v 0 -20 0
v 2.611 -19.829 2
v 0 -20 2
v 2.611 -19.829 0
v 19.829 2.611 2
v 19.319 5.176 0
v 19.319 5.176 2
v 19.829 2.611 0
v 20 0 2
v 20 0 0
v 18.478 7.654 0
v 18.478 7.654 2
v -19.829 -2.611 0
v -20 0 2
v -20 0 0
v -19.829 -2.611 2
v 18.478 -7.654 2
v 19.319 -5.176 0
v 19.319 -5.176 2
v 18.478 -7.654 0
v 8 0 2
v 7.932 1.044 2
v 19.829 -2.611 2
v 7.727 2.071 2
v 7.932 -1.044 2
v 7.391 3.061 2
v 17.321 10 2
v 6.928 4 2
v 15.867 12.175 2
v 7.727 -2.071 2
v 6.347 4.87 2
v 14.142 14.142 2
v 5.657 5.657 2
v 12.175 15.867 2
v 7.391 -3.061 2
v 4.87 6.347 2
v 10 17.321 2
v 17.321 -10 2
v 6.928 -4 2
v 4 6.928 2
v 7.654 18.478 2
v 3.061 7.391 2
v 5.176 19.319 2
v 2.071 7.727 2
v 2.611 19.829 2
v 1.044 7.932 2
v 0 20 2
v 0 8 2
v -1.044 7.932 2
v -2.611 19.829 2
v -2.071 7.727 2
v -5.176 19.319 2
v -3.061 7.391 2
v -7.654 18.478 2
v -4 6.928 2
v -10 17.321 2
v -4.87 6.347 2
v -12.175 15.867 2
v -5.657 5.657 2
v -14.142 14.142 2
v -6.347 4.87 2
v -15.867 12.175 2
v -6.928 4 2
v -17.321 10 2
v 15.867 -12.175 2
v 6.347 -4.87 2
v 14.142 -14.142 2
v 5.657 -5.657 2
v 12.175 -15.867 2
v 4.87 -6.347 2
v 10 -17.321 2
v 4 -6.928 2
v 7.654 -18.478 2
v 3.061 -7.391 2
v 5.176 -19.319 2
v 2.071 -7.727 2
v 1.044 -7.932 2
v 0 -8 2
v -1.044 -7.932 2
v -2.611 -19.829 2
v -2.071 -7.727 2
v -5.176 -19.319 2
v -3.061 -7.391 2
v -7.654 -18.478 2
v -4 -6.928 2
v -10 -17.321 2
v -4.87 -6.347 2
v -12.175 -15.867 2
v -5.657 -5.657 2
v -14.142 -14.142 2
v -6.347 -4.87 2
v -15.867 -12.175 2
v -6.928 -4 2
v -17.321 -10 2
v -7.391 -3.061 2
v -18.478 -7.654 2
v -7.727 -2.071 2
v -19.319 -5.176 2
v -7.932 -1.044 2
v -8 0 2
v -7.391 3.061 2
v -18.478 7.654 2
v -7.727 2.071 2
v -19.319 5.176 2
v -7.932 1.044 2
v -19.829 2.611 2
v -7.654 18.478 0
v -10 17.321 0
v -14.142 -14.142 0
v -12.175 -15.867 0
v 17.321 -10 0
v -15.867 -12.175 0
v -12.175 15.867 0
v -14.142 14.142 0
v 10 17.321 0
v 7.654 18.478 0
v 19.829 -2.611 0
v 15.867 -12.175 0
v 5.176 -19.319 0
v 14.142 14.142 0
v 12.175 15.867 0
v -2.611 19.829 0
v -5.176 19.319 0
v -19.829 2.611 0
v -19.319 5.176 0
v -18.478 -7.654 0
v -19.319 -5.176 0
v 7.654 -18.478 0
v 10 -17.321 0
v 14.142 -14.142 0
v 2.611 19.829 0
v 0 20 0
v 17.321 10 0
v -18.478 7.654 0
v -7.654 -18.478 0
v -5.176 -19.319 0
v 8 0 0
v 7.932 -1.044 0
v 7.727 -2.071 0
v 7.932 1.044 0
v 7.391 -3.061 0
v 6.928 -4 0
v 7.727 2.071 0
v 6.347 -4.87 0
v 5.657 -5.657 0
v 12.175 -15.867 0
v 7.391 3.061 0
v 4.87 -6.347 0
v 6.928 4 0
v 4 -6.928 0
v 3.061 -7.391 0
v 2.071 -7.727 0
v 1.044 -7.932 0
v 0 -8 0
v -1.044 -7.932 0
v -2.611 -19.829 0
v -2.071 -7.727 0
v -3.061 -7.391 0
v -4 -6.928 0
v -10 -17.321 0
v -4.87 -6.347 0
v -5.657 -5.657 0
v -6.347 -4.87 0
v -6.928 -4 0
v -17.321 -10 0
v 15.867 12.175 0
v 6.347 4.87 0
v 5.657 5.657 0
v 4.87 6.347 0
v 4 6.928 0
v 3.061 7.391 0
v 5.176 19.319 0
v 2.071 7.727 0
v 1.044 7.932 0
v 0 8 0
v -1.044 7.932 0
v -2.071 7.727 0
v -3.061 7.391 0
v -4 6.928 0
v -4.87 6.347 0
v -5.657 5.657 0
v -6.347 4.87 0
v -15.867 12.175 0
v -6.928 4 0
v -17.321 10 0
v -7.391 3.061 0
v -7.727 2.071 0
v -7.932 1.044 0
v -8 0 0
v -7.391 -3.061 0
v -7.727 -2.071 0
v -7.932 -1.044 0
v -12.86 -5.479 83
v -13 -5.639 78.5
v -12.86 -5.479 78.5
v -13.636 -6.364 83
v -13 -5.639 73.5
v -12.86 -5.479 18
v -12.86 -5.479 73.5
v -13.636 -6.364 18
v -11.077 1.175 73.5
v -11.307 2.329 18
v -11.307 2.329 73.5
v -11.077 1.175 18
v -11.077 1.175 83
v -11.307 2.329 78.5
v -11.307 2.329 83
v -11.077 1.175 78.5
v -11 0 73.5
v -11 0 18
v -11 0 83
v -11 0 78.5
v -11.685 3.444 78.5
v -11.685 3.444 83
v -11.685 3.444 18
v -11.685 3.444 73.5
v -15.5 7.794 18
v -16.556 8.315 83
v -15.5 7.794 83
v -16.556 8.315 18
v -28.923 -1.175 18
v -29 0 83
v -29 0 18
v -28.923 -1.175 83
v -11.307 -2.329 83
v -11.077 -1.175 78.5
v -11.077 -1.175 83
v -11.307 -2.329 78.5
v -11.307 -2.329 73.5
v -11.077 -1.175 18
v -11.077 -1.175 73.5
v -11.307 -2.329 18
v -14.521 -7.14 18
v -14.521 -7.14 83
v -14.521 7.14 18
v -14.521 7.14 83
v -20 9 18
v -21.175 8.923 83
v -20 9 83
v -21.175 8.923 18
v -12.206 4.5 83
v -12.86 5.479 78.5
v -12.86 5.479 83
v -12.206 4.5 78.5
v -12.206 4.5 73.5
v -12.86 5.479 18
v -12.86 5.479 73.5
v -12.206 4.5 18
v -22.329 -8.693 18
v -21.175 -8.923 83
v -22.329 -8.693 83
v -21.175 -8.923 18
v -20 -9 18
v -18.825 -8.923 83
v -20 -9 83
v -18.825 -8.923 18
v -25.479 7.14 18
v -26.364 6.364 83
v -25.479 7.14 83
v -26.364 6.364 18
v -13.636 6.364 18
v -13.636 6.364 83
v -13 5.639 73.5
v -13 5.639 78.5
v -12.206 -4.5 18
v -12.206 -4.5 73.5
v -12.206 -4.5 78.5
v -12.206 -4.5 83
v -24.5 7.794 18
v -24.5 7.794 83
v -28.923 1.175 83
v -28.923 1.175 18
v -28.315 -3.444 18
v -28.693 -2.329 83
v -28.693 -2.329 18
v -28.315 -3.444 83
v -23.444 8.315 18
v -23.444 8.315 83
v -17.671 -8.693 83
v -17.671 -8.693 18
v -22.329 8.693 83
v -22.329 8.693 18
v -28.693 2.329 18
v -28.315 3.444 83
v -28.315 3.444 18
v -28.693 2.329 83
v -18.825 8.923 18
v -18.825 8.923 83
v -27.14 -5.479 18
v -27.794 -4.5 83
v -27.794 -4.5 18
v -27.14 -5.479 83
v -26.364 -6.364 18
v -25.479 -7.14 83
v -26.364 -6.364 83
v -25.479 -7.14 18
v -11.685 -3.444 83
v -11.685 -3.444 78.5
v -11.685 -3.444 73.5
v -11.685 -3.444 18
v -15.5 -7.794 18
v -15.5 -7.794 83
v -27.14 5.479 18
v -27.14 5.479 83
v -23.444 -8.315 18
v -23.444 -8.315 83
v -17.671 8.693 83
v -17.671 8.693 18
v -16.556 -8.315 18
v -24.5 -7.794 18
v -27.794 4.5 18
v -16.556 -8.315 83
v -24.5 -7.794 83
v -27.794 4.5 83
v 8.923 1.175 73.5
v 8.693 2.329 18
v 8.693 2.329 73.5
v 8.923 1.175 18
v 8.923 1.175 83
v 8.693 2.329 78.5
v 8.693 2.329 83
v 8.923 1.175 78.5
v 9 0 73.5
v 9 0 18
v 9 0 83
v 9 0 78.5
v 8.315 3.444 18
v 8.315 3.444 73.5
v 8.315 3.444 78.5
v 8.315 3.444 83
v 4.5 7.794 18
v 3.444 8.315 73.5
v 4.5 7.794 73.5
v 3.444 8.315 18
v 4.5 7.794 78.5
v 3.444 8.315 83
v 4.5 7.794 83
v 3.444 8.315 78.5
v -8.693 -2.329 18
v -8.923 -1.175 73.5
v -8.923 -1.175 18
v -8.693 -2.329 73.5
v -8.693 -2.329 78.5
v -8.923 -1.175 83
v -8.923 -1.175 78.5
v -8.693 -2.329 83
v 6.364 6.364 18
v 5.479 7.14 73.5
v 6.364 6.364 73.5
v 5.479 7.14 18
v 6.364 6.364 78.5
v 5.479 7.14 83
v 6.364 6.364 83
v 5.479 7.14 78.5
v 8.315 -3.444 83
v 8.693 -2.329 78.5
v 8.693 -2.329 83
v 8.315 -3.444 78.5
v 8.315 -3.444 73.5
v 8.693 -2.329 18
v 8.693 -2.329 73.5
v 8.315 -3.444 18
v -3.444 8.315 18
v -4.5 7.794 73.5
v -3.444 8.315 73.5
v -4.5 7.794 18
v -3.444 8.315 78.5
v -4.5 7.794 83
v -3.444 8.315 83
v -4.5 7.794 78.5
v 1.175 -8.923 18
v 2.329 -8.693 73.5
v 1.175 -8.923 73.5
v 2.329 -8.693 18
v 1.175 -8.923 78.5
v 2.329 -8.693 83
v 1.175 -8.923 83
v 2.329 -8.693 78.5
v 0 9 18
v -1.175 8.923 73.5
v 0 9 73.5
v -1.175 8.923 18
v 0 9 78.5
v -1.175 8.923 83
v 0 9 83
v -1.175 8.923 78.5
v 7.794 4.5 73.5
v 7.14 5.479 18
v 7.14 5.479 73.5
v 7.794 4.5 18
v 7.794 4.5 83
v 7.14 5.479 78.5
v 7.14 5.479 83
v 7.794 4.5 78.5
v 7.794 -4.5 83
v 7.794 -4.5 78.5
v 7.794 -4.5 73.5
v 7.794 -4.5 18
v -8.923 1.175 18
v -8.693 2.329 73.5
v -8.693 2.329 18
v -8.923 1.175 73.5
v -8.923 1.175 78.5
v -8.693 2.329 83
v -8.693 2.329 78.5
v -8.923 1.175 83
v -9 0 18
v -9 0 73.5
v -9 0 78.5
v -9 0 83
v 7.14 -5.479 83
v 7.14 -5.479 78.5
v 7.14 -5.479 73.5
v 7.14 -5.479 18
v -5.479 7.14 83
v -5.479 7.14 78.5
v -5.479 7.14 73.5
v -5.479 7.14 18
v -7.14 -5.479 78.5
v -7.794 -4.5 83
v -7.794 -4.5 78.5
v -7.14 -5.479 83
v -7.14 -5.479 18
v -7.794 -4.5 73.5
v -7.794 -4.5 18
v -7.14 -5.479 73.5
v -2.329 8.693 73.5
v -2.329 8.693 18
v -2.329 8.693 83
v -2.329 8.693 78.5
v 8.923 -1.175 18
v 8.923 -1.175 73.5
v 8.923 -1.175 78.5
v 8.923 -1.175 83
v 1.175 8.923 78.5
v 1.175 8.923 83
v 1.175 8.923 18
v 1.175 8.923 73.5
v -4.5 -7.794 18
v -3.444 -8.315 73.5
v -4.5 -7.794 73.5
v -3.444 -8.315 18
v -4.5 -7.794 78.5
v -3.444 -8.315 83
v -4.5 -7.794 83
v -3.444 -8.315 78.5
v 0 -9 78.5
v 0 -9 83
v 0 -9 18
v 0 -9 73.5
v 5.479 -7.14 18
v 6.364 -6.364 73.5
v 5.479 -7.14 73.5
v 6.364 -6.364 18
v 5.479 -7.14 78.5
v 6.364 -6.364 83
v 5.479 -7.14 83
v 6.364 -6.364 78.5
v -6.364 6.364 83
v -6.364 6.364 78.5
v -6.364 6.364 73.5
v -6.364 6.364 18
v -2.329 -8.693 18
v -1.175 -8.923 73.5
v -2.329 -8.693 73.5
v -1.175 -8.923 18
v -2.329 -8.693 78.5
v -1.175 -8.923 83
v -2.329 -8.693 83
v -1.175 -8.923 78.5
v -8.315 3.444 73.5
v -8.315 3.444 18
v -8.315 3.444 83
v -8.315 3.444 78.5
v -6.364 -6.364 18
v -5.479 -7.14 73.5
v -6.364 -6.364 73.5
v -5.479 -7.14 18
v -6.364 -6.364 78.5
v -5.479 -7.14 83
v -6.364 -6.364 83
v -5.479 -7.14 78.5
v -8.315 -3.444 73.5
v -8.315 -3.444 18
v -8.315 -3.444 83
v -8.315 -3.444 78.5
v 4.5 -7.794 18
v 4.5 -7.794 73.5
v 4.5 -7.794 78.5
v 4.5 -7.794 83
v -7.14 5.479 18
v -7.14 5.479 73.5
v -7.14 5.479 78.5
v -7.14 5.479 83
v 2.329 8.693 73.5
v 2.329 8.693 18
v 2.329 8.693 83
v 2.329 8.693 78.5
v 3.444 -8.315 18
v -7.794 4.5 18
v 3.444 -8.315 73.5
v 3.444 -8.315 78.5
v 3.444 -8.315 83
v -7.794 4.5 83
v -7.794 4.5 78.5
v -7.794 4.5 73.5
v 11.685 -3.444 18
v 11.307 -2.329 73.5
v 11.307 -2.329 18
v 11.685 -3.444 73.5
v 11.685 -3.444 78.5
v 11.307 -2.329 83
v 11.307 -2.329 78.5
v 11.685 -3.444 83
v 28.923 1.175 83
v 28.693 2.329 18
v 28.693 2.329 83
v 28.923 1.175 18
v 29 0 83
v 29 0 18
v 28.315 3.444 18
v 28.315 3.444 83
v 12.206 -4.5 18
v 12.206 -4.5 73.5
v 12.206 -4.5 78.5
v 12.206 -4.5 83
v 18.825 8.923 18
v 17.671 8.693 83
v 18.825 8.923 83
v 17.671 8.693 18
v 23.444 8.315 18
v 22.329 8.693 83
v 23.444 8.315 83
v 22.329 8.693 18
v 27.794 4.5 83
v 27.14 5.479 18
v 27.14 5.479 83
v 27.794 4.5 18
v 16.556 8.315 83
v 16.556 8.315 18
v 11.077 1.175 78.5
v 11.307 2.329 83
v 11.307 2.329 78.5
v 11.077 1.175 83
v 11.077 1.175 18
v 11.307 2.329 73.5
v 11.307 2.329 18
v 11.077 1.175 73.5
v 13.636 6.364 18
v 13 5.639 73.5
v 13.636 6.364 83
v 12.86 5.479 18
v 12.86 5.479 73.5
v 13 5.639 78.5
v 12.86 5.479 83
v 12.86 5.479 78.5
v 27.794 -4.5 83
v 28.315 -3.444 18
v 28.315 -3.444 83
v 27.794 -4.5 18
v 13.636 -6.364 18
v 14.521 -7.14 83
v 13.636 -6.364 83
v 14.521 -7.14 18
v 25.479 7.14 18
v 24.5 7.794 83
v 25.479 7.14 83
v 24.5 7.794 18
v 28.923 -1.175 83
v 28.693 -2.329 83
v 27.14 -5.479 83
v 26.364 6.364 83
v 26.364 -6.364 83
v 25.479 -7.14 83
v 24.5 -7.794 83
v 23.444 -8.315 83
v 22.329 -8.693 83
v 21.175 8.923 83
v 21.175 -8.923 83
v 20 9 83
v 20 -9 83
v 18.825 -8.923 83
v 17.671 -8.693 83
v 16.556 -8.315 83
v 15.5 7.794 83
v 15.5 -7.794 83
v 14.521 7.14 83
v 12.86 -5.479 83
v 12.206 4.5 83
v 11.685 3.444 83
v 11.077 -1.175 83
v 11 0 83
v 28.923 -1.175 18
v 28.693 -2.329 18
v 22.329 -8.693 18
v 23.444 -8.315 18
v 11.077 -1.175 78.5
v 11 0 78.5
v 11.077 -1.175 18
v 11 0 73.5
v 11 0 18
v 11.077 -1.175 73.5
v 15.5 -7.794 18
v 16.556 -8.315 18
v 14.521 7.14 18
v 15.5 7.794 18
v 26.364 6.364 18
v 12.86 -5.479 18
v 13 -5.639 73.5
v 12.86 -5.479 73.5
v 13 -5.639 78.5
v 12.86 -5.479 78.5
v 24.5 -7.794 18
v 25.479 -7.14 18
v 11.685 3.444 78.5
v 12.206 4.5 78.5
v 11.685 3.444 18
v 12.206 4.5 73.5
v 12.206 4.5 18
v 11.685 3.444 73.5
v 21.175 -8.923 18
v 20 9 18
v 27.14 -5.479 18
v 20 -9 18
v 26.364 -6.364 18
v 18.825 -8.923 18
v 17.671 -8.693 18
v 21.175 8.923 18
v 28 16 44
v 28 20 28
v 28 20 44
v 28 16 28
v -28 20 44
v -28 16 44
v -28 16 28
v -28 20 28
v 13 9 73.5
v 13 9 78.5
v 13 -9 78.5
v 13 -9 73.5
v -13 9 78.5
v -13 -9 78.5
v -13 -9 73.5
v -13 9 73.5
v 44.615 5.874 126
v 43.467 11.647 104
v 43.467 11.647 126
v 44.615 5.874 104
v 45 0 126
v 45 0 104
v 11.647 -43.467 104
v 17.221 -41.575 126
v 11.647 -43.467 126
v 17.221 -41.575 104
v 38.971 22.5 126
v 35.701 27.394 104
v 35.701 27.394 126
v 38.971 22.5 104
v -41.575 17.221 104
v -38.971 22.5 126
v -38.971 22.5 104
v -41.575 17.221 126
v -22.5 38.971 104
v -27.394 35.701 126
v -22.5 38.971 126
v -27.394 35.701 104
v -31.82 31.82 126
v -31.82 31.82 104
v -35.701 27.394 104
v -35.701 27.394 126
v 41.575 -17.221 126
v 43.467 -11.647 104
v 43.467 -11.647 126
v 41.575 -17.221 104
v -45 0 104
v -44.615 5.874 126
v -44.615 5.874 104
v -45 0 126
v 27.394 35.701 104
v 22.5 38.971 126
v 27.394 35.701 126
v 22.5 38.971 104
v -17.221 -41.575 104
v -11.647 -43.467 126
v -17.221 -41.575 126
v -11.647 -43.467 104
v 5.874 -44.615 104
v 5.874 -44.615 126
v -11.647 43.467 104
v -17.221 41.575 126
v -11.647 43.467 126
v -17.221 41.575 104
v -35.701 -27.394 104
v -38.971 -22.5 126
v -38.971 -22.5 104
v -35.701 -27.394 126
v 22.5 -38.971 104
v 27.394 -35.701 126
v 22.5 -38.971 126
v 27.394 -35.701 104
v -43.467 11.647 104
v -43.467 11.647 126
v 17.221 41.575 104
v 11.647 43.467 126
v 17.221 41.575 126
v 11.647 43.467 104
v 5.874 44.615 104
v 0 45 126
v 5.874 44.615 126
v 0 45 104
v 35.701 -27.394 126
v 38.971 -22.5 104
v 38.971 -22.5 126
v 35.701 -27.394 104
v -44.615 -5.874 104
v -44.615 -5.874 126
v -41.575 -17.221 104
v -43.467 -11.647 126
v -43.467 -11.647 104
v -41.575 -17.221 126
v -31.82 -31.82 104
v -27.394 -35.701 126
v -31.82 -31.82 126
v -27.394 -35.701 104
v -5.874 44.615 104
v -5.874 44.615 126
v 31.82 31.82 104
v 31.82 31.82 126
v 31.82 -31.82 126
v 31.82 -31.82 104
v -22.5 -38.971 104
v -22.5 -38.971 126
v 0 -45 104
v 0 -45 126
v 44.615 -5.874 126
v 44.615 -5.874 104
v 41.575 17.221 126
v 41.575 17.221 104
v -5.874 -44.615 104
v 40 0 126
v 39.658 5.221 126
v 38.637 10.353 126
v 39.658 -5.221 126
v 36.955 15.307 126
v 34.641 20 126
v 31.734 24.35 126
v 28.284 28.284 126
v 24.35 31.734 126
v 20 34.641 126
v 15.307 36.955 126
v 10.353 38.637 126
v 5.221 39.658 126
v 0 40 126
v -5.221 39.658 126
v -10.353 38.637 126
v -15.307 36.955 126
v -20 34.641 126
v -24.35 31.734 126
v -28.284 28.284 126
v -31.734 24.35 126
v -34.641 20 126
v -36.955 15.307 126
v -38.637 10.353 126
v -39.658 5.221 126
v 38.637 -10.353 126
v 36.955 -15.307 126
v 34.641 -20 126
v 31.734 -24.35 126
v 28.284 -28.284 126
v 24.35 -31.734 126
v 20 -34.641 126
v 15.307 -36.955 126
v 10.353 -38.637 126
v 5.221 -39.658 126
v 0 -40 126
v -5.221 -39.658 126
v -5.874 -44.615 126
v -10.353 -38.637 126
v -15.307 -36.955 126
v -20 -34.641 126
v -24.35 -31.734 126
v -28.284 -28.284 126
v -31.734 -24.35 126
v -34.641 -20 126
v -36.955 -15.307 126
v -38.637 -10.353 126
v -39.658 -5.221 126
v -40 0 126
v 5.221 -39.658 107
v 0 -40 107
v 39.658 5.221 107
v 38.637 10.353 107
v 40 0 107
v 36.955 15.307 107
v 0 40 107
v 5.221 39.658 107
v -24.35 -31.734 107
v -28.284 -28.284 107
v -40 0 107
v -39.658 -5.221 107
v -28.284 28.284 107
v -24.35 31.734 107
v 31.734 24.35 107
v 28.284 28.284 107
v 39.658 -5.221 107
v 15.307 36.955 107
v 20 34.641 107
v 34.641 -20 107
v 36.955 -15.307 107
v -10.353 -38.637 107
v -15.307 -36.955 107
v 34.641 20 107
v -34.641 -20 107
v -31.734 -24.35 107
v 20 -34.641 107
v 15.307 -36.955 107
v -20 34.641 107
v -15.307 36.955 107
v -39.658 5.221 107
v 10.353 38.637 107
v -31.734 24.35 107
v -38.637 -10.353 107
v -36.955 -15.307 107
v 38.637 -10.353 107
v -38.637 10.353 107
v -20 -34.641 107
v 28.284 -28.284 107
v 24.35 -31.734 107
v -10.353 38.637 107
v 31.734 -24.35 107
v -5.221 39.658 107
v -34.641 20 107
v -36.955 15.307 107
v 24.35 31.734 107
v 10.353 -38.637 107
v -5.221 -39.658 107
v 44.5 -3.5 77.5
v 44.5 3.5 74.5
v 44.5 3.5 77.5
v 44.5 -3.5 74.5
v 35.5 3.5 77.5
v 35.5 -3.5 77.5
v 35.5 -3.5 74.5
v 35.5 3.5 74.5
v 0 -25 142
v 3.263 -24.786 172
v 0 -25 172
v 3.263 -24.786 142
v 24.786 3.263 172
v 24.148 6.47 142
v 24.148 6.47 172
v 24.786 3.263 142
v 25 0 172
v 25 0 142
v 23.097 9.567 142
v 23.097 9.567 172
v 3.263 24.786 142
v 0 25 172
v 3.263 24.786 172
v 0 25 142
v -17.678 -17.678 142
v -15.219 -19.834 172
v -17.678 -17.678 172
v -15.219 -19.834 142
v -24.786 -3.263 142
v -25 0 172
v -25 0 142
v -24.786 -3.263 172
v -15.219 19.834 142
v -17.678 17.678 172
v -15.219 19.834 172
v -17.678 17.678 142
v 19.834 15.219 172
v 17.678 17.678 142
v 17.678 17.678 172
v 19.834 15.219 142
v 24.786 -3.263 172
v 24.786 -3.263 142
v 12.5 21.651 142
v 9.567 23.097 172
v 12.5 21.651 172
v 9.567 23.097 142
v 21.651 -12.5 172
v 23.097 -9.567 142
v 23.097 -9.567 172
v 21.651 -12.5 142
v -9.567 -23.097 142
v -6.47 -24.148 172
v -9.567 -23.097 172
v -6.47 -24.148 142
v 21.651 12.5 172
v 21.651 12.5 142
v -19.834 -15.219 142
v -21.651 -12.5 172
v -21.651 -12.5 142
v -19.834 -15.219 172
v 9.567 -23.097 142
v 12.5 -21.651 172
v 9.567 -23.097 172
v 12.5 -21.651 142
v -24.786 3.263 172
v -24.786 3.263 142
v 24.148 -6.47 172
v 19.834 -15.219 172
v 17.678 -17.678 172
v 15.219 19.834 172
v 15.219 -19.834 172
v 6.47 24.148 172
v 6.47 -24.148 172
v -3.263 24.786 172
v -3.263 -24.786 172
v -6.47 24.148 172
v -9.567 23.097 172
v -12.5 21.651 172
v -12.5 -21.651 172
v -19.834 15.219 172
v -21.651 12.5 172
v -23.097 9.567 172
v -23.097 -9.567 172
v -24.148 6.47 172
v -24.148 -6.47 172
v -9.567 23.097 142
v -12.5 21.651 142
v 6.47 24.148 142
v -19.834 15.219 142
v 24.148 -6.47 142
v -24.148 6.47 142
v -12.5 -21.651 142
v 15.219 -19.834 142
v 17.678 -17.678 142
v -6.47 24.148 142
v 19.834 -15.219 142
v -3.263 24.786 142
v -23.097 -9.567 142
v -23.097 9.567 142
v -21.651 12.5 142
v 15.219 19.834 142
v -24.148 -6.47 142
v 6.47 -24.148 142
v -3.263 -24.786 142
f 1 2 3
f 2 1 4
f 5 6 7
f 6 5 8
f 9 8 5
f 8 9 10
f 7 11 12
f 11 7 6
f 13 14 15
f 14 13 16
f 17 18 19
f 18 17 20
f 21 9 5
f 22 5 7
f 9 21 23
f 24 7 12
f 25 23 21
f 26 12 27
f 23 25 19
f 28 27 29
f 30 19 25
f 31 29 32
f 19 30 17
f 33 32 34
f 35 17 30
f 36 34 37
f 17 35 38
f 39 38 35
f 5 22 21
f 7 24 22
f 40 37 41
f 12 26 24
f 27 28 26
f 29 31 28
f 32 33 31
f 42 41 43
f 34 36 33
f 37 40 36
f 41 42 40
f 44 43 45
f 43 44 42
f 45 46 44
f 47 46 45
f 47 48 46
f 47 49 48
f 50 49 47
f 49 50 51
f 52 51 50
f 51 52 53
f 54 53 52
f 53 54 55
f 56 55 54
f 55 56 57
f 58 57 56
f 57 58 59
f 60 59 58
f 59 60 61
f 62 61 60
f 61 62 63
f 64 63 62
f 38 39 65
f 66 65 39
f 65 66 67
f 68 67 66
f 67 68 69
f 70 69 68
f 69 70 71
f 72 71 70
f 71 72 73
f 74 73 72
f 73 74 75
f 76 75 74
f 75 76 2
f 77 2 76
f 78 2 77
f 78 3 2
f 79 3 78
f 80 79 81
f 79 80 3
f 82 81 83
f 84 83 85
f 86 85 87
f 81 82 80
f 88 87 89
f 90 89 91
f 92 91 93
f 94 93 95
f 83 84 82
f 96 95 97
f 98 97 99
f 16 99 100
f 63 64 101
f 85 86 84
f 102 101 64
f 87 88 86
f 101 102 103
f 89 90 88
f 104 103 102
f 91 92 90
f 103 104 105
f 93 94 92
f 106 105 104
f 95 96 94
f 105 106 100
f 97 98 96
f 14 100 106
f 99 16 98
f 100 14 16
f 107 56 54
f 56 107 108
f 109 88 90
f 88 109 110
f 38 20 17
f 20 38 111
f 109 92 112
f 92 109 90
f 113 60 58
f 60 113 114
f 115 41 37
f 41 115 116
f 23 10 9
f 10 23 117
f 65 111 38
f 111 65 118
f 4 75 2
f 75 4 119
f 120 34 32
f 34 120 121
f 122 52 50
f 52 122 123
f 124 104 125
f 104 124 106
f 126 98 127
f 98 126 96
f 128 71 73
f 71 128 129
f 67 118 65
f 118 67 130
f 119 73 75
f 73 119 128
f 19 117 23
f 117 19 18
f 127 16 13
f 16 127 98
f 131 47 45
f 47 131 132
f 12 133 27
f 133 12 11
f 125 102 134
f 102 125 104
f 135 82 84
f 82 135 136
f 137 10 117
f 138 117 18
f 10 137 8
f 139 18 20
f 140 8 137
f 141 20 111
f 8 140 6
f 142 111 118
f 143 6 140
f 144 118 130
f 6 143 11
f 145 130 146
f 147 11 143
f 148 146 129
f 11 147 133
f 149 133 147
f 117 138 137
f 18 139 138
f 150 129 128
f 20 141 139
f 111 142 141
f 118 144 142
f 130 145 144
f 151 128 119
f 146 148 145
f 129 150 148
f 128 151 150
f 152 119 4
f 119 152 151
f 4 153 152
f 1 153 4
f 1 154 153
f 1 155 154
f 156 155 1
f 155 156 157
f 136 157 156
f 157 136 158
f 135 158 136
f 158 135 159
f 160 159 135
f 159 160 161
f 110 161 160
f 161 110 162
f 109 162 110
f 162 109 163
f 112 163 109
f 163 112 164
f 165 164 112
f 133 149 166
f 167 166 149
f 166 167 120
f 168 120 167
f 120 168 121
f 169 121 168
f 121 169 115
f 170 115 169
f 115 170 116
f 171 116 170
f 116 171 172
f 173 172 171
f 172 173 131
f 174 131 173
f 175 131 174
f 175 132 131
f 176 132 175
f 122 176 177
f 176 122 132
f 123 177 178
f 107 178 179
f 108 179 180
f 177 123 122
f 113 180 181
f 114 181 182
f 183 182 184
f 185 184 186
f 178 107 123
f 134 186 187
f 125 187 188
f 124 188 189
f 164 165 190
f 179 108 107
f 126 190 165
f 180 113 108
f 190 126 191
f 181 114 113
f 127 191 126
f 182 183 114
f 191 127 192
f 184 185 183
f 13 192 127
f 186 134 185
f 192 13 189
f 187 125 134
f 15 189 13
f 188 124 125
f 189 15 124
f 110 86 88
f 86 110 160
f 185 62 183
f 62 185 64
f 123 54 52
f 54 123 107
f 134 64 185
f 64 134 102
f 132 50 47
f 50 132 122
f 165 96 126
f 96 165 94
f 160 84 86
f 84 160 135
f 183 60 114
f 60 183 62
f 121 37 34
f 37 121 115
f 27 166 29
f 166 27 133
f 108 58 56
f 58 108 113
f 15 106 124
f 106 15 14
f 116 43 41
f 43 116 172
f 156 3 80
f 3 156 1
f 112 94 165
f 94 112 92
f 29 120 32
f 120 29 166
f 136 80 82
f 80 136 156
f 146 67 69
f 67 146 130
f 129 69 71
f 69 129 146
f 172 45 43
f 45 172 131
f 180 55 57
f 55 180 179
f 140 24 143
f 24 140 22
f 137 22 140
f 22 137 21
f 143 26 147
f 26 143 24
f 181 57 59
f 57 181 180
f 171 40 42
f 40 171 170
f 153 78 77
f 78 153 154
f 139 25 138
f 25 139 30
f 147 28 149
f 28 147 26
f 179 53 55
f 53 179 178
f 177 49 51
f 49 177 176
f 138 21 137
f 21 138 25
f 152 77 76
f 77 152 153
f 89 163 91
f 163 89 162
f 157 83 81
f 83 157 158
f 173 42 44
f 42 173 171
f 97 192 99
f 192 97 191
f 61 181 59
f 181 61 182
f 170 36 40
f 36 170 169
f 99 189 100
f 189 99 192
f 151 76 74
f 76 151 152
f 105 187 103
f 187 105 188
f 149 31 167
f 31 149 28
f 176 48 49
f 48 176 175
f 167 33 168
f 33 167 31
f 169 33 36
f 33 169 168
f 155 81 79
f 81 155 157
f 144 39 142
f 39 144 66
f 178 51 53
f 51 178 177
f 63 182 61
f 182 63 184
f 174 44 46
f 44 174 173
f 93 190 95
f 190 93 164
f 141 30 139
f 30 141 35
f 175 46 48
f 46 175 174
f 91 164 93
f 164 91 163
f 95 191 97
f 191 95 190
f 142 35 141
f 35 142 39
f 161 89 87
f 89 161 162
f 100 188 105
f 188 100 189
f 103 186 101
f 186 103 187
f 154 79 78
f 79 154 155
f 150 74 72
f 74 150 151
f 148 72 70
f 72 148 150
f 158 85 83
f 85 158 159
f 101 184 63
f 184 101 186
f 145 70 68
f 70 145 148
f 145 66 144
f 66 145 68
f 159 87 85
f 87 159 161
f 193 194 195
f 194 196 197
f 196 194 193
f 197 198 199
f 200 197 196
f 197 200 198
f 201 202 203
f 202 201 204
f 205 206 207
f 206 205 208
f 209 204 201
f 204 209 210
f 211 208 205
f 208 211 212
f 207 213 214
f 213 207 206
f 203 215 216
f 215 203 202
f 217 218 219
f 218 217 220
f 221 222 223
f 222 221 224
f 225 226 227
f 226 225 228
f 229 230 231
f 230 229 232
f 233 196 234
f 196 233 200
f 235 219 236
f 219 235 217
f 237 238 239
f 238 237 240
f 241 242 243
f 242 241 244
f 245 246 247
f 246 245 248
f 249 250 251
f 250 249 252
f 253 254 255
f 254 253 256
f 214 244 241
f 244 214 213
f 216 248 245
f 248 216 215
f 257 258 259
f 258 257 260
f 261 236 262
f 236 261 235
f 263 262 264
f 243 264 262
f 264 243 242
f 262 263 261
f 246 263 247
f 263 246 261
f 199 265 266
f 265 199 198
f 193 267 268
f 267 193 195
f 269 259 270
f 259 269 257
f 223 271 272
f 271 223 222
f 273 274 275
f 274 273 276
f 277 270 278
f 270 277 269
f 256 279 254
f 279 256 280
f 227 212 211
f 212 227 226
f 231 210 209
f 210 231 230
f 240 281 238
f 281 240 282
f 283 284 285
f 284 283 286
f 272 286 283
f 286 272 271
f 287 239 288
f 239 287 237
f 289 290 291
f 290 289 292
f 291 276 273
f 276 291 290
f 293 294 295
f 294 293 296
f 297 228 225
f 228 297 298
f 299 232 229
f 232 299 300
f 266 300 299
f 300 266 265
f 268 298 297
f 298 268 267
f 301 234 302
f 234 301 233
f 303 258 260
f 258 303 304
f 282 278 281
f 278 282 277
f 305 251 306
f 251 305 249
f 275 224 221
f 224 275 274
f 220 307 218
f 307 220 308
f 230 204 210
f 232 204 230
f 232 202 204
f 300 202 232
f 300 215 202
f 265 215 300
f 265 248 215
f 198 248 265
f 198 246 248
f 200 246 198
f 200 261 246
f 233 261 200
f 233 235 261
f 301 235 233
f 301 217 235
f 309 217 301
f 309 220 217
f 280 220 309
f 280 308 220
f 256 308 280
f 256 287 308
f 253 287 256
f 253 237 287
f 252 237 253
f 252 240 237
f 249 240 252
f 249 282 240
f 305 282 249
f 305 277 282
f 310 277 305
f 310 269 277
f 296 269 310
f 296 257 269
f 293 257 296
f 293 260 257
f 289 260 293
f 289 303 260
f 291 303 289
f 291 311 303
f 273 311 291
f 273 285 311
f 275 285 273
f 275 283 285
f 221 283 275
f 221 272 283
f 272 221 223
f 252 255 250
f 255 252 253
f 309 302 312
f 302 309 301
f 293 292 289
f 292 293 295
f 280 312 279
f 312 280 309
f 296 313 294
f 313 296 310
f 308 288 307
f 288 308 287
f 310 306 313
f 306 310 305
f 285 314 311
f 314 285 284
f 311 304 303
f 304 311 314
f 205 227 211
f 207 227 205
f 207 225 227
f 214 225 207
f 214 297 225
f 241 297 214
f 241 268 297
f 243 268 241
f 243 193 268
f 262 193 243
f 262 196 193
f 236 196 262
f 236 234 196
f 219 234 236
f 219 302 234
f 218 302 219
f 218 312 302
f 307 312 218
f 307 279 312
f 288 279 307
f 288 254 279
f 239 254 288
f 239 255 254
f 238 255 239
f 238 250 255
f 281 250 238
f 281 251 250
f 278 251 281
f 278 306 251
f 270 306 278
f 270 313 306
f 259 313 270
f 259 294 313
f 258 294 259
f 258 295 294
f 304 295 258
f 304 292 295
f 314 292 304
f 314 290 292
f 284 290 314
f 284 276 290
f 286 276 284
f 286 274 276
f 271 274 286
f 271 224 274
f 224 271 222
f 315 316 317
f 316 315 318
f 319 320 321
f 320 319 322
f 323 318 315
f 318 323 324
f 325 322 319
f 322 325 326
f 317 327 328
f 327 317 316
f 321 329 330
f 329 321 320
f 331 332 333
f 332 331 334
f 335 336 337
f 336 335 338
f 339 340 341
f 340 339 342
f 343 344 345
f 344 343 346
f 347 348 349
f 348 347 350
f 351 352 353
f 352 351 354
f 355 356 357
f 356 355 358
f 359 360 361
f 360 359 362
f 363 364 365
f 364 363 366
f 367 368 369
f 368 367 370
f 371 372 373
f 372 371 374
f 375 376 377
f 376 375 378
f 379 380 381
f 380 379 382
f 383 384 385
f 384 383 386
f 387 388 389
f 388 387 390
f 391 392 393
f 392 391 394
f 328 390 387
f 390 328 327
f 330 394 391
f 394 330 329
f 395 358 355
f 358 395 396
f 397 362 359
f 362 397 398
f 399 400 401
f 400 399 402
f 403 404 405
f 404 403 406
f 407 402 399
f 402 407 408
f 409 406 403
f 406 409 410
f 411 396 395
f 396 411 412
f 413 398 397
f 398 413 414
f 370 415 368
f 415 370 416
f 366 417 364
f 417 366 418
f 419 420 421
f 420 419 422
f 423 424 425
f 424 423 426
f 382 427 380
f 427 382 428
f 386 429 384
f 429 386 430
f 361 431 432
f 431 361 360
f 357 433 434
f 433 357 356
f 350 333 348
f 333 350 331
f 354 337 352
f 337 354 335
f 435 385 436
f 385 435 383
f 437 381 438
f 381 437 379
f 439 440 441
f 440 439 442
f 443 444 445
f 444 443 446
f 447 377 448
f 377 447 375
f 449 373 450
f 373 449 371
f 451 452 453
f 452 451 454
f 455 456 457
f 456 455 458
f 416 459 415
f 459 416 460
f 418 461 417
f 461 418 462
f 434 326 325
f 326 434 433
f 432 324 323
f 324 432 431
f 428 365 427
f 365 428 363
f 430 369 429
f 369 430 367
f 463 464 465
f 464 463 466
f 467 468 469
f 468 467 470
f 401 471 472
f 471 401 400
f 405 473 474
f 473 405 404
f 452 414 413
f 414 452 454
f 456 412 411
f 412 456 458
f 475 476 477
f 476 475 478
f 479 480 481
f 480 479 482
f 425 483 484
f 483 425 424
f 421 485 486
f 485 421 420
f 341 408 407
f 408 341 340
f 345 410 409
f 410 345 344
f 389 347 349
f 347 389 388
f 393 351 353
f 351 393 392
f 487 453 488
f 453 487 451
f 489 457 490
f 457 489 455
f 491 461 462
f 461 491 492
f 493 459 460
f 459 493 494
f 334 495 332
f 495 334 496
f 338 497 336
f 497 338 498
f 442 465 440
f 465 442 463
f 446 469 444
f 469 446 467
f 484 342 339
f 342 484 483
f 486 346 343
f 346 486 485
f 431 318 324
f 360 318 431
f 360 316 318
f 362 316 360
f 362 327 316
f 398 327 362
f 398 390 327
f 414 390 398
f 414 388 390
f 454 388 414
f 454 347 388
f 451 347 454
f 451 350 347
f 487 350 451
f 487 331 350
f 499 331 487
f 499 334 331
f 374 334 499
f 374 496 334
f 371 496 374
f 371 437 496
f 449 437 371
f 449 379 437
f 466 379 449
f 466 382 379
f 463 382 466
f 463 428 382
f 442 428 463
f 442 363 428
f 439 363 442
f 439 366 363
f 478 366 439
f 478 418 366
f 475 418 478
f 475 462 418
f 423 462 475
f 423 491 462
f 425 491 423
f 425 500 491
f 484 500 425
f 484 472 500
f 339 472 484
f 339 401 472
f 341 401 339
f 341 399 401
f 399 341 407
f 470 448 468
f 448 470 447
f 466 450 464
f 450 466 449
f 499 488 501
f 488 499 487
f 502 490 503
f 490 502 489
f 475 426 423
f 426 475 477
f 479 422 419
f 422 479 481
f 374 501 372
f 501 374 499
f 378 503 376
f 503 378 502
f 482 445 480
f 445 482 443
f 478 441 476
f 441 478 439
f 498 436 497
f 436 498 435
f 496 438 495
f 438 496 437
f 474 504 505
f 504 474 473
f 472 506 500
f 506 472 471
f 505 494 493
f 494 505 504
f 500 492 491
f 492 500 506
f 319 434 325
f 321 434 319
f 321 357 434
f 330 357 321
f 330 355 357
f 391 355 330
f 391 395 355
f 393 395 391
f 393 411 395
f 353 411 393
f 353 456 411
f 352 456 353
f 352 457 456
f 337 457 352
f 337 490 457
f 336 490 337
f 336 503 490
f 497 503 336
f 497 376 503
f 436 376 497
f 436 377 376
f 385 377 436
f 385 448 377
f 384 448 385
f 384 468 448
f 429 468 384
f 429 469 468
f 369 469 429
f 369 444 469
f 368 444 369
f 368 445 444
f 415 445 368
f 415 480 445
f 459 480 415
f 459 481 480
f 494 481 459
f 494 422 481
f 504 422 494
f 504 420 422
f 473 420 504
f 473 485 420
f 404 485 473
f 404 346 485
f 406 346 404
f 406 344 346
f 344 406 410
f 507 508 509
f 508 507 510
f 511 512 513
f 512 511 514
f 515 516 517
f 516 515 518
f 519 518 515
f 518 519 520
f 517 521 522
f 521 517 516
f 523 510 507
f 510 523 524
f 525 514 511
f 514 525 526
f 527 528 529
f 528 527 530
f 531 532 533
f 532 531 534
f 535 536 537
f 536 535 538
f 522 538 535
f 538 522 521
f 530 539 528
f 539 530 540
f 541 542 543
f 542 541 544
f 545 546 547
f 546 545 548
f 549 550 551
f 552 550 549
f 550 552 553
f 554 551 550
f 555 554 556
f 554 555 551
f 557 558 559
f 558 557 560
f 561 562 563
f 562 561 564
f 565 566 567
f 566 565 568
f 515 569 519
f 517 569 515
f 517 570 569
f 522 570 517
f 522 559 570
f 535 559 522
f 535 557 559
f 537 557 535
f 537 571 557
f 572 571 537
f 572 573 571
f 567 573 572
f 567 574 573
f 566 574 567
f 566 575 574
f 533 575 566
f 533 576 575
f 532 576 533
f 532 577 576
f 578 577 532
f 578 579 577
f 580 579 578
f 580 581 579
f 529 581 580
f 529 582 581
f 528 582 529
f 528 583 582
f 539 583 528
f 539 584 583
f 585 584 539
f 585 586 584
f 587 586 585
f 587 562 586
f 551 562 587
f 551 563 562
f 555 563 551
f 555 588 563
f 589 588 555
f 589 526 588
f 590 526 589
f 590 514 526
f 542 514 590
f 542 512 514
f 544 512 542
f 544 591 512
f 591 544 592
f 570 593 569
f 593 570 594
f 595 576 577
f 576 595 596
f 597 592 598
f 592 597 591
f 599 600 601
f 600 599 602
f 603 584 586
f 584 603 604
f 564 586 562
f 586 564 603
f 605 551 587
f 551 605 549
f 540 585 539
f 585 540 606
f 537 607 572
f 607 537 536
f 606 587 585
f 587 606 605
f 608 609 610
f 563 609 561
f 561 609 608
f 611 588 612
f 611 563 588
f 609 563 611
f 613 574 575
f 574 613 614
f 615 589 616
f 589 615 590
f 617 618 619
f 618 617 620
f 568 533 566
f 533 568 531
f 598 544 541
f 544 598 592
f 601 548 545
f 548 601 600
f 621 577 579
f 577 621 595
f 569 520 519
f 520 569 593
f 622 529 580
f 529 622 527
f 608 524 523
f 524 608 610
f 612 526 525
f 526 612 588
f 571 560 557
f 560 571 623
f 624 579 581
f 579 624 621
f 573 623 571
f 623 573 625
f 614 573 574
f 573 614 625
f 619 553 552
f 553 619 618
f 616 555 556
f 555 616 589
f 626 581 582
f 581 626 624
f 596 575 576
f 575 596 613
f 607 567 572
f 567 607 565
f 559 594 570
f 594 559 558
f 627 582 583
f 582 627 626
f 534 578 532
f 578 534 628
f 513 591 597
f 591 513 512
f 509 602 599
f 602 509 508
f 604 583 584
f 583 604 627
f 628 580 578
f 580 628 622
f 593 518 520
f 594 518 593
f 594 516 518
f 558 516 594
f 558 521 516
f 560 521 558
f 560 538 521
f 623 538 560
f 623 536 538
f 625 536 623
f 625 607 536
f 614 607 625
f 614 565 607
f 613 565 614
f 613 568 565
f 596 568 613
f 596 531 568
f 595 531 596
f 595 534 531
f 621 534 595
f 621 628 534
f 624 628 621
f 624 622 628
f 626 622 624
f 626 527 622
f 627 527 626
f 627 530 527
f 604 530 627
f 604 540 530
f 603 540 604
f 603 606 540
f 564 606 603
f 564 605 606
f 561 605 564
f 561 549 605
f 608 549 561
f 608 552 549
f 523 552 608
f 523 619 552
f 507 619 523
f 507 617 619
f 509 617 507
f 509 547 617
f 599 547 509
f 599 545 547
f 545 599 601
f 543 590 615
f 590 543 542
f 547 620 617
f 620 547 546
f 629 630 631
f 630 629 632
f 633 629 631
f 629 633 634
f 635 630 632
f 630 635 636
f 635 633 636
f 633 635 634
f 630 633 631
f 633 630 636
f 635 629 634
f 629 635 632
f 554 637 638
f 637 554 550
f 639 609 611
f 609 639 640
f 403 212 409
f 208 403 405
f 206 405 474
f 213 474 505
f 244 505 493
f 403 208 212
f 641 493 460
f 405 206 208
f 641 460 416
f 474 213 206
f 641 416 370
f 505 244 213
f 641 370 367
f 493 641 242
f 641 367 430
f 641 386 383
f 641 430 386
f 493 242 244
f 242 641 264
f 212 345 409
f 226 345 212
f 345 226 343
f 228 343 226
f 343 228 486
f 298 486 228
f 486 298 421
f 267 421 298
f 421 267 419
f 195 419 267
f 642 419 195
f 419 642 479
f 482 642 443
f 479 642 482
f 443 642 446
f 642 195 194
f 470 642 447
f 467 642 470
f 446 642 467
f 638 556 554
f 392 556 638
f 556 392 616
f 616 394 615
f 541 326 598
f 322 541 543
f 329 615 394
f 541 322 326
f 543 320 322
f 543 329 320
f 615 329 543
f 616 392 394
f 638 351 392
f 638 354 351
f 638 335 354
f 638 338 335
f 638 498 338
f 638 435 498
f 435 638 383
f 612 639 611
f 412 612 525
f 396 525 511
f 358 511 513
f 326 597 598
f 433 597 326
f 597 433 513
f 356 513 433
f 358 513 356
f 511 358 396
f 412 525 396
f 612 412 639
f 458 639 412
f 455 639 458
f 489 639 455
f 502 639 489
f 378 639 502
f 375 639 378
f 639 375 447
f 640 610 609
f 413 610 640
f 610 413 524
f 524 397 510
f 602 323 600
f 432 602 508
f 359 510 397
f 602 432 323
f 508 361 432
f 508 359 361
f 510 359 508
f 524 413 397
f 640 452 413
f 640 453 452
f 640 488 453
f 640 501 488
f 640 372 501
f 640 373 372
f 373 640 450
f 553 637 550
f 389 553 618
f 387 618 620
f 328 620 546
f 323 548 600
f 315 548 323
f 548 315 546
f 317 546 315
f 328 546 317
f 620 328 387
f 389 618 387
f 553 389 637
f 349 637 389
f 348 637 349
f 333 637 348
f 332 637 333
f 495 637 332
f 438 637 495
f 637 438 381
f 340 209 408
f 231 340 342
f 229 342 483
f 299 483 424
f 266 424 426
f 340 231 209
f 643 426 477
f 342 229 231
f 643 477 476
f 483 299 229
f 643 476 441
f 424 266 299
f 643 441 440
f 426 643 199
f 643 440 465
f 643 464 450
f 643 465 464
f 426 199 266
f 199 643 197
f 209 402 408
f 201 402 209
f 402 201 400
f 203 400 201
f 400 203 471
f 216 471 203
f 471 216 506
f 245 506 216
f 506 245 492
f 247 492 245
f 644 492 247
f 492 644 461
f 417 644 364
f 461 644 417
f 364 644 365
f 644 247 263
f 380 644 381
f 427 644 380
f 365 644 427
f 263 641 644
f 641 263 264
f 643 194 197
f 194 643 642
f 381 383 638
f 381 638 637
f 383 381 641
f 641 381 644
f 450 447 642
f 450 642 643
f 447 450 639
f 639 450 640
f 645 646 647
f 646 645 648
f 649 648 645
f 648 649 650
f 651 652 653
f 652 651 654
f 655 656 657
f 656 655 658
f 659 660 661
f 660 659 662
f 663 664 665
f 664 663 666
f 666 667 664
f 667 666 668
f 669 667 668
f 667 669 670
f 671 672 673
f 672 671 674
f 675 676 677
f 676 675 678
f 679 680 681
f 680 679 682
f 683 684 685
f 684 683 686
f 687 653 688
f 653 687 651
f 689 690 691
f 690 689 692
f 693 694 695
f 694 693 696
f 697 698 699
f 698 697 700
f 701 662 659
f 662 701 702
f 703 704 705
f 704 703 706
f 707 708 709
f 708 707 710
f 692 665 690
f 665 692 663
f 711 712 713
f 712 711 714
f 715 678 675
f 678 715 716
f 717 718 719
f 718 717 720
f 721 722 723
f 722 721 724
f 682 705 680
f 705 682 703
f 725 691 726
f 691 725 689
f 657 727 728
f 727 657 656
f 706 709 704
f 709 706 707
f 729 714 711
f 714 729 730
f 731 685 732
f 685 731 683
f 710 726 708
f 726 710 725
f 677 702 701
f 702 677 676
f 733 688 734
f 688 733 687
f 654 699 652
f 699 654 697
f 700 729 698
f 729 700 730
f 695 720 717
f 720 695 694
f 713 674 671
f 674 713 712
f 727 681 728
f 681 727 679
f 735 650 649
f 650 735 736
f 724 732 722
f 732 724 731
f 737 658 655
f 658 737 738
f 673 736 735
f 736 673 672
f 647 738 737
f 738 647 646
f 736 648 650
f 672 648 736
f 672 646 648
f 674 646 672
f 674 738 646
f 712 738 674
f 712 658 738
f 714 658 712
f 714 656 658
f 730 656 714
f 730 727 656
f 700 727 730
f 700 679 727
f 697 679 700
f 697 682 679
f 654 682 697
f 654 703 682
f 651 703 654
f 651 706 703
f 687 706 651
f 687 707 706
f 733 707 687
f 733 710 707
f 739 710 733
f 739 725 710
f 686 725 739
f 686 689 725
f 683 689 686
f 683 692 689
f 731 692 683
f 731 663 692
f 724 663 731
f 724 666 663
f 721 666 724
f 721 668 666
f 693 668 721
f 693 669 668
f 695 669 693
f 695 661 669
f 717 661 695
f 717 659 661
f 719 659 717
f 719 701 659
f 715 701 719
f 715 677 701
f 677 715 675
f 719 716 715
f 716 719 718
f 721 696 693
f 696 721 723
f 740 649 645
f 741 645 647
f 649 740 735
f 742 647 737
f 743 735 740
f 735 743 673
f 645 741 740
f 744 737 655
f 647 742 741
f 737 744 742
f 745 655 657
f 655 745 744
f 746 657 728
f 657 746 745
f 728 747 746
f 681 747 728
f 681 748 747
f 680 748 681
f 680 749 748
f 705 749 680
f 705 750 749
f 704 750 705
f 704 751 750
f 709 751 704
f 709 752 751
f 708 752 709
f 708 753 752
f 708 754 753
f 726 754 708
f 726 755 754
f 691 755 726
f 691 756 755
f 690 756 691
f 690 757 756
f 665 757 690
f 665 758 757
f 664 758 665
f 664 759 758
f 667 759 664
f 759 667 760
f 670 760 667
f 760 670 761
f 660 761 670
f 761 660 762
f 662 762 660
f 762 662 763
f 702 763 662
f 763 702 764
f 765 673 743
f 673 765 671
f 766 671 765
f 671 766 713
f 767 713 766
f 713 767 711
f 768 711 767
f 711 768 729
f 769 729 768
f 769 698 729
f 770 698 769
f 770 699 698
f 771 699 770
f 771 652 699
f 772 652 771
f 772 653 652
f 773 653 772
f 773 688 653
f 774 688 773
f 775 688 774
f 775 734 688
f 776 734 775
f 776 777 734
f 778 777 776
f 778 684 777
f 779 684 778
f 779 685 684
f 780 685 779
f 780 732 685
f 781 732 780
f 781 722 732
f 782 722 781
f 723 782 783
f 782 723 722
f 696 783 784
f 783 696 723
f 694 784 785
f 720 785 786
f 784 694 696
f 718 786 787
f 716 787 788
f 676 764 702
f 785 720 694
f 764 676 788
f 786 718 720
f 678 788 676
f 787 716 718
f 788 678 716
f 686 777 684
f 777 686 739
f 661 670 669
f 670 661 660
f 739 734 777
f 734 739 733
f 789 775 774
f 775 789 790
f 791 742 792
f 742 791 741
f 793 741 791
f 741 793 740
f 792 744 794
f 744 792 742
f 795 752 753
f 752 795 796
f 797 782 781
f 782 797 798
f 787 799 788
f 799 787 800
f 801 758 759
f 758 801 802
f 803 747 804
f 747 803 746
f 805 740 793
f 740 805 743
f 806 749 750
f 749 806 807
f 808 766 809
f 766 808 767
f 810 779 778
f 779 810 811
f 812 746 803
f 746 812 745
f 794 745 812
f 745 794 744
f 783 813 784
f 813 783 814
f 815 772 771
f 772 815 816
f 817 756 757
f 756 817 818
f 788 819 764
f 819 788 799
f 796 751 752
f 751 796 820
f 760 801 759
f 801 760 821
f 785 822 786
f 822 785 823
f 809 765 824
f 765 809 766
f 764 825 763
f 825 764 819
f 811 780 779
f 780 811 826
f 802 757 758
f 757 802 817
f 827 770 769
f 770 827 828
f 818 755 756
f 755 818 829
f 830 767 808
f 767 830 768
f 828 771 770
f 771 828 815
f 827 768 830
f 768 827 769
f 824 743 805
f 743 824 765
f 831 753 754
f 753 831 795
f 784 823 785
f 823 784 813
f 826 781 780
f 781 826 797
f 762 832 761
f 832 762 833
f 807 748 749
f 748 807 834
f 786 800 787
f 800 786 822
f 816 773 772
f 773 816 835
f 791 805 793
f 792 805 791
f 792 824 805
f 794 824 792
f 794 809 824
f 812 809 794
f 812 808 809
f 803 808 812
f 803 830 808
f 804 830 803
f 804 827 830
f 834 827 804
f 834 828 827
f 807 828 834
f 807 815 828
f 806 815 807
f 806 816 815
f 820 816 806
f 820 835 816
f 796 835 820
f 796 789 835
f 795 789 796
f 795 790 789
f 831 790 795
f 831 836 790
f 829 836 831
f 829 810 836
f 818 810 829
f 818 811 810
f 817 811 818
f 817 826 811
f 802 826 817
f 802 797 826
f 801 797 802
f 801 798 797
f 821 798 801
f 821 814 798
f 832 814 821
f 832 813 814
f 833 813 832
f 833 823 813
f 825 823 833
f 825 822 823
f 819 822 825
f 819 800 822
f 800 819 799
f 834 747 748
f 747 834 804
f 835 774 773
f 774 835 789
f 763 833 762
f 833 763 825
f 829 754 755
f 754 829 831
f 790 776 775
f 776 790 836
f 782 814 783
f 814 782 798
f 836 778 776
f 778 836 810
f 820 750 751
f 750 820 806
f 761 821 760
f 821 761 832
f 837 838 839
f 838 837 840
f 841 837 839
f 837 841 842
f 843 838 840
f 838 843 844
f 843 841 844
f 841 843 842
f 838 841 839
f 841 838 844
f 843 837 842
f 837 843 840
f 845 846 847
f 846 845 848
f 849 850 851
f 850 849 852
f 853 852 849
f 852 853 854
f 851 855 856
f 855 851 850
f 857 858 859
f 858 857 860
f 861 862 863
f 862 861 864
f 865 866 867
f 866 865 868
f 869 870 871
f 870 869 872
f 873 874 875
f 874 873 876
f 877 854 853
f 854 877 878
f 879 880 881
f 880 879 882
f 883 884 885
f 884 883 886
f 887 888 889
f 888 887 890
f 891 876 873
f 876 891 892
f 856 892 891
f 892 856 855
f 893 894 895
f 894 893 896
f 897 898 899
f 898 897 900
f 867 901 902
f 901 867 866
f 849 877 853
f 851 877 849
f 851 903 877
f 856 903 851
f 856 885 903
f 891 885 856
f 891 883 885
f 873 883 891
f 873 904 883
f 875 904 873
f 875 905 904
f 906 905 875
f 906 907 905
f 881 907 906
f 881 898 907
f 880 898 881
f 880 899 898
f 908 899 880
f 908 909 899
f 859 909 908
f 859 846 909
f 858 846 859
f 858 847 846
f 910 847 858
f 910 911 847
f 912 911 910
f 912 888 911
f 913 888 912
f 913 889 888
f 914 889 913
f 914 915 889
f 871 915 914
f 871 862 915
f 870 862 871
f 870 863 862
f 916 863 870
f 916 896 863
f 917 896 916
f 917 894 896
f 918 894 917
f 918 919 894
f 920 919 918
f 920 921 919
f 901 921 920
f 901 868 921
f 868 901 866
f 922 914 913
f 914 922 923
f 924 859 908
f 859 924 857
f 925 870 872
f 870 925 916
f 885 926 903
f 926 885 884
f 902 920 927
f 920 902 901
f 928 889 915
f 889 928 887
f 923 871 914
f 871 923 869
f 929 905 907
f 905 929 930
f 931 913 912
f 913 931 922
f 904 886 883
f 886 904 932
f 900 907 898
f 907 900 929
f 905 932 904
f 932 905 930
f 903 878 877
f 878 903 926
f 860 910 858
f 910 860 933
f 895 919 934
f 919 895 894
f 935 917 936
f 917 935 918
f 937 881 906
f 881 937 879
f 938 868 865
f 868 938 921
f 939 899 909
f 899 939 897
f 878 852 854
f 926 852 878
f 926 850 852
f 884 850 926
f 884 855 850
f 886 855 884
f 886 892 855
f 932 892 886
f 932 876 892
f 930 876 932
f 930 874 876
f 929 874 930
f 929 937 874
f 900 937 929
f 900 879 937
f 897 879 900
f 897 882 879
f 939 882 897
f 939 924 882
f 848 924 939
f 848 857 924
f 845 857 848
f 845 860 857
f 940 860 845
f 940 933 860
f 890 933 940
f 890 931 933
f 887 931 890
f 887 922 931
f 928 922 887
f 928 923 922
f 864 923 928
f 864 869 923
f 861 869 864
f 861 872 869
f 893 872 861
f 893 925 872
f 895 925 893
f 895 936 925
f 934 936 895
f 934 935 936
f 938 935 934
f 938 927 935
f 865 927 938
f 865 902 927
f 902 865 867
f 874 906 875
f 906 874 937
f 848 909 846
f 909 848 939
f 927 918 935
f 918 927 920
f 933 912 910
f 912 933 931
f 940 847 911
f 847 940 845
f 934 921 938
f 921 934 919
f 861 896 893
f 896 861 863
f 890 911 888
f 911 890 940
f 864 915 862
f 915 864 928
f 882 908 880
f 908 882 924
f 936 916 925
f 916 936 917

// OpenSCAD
// Agent Body Protocol — lamp BASE exploded drawing.
// Phase 1–3 path only. Not a manufactured part. Not a pack we shipped.
// Rage Industries built the protocol, not the lamp.
//
//   openscad docs/hardware/base-exploded.scad
//
// Occupancy (bottom → top), all in the BASE, never the shade/head:
//   1. Qi RX coil (Phase 3 drawing — not shipped)
//   2. 18650/21700 + BMS (Phase 2 drawing — not shipped; BMS required)
//   3. Phase 1 divider + ADS1115 on the 12 V wall rail (this PR: software + drawing)
//   4. USB-C charge jack on the base rim (Phase 2 drawing)
// Thermal: pack/BMS sit in the base, away from the LED head.

$fn = 48;
gap = 18;

module base_shell() {
    color([0.15, 0.15, 0.18])
        difference() {
            cylinder(h = 22, d = 90);
            translate([0, 0, 3]) cylinder(h = 20, d = 80);
        }
}

module qi_rx_coil() {
    // Phase 3 drawing. Coil under the base, facing the bench TX pad.
    color([0.85, 0.65, 0.15])
        difference() {
            cylinder(h = 2, d = 40);
            translate([0, 0, -0.5]) cylinder(h = 3, d = 16);
        }
}

module pack_and_bms() {
    // Phase 2 drawing. 3S 18650/21700 + BMS. No homemade pouch.
    for (i = [-1, 0, 1]) {
        translate([i * 20, 0, 0])
            color([0.2, 0.2, 0.25]) cylinder(h = 65, d = 18);
    }
    translate([-28, 16, 10])
        color([0.1, 0.45, 0.2]) cube([56, 4, 16], center = false);
}

module divider_adc() {
    // Phase 1: 39.2 kΩ / 10.0 kΩ into ADS1115 (Adafruit 1085). 12 V rail tap.
    color([0.12, 0.35, 0.55]) cube([26, 18, 5], center = true);
    translate([16, 0, 0]) color([0.7, 0.15, 0.15]) cube([4, 10, 3], center = true); // R_high
    translate([21, 0, 0]) color([0.15, 0.15, 0.7]) cube([4, 10, 3], center = true); // R_low
}

module usbc_jack() {
    color([0.4, 0.4, 0.42]) cube([9, 7, 3], center = true);
}

module led_head_ghost() {
    // Not a power location. Shown only so the drawing keeps the head empty.
    color([0.8, 0.8, 0.85, 0.15])
        translate([0, 0, 0]) cylinder(h = 30, d = 50);
}

translate([0, 0, 0]) qi_rx_coil();
translate([0, 0, gap]) pack_and_bms();
translate([0, 0, gap * 2 + 40]) divider_adc();
translate([40, 0, gap * 2 + 40]) usbc_jack();
translate([0, 0, gap * 3 + 50]) base_shell();
translate([0, 0, gap * 4 + 70]) led_head_ghost();
